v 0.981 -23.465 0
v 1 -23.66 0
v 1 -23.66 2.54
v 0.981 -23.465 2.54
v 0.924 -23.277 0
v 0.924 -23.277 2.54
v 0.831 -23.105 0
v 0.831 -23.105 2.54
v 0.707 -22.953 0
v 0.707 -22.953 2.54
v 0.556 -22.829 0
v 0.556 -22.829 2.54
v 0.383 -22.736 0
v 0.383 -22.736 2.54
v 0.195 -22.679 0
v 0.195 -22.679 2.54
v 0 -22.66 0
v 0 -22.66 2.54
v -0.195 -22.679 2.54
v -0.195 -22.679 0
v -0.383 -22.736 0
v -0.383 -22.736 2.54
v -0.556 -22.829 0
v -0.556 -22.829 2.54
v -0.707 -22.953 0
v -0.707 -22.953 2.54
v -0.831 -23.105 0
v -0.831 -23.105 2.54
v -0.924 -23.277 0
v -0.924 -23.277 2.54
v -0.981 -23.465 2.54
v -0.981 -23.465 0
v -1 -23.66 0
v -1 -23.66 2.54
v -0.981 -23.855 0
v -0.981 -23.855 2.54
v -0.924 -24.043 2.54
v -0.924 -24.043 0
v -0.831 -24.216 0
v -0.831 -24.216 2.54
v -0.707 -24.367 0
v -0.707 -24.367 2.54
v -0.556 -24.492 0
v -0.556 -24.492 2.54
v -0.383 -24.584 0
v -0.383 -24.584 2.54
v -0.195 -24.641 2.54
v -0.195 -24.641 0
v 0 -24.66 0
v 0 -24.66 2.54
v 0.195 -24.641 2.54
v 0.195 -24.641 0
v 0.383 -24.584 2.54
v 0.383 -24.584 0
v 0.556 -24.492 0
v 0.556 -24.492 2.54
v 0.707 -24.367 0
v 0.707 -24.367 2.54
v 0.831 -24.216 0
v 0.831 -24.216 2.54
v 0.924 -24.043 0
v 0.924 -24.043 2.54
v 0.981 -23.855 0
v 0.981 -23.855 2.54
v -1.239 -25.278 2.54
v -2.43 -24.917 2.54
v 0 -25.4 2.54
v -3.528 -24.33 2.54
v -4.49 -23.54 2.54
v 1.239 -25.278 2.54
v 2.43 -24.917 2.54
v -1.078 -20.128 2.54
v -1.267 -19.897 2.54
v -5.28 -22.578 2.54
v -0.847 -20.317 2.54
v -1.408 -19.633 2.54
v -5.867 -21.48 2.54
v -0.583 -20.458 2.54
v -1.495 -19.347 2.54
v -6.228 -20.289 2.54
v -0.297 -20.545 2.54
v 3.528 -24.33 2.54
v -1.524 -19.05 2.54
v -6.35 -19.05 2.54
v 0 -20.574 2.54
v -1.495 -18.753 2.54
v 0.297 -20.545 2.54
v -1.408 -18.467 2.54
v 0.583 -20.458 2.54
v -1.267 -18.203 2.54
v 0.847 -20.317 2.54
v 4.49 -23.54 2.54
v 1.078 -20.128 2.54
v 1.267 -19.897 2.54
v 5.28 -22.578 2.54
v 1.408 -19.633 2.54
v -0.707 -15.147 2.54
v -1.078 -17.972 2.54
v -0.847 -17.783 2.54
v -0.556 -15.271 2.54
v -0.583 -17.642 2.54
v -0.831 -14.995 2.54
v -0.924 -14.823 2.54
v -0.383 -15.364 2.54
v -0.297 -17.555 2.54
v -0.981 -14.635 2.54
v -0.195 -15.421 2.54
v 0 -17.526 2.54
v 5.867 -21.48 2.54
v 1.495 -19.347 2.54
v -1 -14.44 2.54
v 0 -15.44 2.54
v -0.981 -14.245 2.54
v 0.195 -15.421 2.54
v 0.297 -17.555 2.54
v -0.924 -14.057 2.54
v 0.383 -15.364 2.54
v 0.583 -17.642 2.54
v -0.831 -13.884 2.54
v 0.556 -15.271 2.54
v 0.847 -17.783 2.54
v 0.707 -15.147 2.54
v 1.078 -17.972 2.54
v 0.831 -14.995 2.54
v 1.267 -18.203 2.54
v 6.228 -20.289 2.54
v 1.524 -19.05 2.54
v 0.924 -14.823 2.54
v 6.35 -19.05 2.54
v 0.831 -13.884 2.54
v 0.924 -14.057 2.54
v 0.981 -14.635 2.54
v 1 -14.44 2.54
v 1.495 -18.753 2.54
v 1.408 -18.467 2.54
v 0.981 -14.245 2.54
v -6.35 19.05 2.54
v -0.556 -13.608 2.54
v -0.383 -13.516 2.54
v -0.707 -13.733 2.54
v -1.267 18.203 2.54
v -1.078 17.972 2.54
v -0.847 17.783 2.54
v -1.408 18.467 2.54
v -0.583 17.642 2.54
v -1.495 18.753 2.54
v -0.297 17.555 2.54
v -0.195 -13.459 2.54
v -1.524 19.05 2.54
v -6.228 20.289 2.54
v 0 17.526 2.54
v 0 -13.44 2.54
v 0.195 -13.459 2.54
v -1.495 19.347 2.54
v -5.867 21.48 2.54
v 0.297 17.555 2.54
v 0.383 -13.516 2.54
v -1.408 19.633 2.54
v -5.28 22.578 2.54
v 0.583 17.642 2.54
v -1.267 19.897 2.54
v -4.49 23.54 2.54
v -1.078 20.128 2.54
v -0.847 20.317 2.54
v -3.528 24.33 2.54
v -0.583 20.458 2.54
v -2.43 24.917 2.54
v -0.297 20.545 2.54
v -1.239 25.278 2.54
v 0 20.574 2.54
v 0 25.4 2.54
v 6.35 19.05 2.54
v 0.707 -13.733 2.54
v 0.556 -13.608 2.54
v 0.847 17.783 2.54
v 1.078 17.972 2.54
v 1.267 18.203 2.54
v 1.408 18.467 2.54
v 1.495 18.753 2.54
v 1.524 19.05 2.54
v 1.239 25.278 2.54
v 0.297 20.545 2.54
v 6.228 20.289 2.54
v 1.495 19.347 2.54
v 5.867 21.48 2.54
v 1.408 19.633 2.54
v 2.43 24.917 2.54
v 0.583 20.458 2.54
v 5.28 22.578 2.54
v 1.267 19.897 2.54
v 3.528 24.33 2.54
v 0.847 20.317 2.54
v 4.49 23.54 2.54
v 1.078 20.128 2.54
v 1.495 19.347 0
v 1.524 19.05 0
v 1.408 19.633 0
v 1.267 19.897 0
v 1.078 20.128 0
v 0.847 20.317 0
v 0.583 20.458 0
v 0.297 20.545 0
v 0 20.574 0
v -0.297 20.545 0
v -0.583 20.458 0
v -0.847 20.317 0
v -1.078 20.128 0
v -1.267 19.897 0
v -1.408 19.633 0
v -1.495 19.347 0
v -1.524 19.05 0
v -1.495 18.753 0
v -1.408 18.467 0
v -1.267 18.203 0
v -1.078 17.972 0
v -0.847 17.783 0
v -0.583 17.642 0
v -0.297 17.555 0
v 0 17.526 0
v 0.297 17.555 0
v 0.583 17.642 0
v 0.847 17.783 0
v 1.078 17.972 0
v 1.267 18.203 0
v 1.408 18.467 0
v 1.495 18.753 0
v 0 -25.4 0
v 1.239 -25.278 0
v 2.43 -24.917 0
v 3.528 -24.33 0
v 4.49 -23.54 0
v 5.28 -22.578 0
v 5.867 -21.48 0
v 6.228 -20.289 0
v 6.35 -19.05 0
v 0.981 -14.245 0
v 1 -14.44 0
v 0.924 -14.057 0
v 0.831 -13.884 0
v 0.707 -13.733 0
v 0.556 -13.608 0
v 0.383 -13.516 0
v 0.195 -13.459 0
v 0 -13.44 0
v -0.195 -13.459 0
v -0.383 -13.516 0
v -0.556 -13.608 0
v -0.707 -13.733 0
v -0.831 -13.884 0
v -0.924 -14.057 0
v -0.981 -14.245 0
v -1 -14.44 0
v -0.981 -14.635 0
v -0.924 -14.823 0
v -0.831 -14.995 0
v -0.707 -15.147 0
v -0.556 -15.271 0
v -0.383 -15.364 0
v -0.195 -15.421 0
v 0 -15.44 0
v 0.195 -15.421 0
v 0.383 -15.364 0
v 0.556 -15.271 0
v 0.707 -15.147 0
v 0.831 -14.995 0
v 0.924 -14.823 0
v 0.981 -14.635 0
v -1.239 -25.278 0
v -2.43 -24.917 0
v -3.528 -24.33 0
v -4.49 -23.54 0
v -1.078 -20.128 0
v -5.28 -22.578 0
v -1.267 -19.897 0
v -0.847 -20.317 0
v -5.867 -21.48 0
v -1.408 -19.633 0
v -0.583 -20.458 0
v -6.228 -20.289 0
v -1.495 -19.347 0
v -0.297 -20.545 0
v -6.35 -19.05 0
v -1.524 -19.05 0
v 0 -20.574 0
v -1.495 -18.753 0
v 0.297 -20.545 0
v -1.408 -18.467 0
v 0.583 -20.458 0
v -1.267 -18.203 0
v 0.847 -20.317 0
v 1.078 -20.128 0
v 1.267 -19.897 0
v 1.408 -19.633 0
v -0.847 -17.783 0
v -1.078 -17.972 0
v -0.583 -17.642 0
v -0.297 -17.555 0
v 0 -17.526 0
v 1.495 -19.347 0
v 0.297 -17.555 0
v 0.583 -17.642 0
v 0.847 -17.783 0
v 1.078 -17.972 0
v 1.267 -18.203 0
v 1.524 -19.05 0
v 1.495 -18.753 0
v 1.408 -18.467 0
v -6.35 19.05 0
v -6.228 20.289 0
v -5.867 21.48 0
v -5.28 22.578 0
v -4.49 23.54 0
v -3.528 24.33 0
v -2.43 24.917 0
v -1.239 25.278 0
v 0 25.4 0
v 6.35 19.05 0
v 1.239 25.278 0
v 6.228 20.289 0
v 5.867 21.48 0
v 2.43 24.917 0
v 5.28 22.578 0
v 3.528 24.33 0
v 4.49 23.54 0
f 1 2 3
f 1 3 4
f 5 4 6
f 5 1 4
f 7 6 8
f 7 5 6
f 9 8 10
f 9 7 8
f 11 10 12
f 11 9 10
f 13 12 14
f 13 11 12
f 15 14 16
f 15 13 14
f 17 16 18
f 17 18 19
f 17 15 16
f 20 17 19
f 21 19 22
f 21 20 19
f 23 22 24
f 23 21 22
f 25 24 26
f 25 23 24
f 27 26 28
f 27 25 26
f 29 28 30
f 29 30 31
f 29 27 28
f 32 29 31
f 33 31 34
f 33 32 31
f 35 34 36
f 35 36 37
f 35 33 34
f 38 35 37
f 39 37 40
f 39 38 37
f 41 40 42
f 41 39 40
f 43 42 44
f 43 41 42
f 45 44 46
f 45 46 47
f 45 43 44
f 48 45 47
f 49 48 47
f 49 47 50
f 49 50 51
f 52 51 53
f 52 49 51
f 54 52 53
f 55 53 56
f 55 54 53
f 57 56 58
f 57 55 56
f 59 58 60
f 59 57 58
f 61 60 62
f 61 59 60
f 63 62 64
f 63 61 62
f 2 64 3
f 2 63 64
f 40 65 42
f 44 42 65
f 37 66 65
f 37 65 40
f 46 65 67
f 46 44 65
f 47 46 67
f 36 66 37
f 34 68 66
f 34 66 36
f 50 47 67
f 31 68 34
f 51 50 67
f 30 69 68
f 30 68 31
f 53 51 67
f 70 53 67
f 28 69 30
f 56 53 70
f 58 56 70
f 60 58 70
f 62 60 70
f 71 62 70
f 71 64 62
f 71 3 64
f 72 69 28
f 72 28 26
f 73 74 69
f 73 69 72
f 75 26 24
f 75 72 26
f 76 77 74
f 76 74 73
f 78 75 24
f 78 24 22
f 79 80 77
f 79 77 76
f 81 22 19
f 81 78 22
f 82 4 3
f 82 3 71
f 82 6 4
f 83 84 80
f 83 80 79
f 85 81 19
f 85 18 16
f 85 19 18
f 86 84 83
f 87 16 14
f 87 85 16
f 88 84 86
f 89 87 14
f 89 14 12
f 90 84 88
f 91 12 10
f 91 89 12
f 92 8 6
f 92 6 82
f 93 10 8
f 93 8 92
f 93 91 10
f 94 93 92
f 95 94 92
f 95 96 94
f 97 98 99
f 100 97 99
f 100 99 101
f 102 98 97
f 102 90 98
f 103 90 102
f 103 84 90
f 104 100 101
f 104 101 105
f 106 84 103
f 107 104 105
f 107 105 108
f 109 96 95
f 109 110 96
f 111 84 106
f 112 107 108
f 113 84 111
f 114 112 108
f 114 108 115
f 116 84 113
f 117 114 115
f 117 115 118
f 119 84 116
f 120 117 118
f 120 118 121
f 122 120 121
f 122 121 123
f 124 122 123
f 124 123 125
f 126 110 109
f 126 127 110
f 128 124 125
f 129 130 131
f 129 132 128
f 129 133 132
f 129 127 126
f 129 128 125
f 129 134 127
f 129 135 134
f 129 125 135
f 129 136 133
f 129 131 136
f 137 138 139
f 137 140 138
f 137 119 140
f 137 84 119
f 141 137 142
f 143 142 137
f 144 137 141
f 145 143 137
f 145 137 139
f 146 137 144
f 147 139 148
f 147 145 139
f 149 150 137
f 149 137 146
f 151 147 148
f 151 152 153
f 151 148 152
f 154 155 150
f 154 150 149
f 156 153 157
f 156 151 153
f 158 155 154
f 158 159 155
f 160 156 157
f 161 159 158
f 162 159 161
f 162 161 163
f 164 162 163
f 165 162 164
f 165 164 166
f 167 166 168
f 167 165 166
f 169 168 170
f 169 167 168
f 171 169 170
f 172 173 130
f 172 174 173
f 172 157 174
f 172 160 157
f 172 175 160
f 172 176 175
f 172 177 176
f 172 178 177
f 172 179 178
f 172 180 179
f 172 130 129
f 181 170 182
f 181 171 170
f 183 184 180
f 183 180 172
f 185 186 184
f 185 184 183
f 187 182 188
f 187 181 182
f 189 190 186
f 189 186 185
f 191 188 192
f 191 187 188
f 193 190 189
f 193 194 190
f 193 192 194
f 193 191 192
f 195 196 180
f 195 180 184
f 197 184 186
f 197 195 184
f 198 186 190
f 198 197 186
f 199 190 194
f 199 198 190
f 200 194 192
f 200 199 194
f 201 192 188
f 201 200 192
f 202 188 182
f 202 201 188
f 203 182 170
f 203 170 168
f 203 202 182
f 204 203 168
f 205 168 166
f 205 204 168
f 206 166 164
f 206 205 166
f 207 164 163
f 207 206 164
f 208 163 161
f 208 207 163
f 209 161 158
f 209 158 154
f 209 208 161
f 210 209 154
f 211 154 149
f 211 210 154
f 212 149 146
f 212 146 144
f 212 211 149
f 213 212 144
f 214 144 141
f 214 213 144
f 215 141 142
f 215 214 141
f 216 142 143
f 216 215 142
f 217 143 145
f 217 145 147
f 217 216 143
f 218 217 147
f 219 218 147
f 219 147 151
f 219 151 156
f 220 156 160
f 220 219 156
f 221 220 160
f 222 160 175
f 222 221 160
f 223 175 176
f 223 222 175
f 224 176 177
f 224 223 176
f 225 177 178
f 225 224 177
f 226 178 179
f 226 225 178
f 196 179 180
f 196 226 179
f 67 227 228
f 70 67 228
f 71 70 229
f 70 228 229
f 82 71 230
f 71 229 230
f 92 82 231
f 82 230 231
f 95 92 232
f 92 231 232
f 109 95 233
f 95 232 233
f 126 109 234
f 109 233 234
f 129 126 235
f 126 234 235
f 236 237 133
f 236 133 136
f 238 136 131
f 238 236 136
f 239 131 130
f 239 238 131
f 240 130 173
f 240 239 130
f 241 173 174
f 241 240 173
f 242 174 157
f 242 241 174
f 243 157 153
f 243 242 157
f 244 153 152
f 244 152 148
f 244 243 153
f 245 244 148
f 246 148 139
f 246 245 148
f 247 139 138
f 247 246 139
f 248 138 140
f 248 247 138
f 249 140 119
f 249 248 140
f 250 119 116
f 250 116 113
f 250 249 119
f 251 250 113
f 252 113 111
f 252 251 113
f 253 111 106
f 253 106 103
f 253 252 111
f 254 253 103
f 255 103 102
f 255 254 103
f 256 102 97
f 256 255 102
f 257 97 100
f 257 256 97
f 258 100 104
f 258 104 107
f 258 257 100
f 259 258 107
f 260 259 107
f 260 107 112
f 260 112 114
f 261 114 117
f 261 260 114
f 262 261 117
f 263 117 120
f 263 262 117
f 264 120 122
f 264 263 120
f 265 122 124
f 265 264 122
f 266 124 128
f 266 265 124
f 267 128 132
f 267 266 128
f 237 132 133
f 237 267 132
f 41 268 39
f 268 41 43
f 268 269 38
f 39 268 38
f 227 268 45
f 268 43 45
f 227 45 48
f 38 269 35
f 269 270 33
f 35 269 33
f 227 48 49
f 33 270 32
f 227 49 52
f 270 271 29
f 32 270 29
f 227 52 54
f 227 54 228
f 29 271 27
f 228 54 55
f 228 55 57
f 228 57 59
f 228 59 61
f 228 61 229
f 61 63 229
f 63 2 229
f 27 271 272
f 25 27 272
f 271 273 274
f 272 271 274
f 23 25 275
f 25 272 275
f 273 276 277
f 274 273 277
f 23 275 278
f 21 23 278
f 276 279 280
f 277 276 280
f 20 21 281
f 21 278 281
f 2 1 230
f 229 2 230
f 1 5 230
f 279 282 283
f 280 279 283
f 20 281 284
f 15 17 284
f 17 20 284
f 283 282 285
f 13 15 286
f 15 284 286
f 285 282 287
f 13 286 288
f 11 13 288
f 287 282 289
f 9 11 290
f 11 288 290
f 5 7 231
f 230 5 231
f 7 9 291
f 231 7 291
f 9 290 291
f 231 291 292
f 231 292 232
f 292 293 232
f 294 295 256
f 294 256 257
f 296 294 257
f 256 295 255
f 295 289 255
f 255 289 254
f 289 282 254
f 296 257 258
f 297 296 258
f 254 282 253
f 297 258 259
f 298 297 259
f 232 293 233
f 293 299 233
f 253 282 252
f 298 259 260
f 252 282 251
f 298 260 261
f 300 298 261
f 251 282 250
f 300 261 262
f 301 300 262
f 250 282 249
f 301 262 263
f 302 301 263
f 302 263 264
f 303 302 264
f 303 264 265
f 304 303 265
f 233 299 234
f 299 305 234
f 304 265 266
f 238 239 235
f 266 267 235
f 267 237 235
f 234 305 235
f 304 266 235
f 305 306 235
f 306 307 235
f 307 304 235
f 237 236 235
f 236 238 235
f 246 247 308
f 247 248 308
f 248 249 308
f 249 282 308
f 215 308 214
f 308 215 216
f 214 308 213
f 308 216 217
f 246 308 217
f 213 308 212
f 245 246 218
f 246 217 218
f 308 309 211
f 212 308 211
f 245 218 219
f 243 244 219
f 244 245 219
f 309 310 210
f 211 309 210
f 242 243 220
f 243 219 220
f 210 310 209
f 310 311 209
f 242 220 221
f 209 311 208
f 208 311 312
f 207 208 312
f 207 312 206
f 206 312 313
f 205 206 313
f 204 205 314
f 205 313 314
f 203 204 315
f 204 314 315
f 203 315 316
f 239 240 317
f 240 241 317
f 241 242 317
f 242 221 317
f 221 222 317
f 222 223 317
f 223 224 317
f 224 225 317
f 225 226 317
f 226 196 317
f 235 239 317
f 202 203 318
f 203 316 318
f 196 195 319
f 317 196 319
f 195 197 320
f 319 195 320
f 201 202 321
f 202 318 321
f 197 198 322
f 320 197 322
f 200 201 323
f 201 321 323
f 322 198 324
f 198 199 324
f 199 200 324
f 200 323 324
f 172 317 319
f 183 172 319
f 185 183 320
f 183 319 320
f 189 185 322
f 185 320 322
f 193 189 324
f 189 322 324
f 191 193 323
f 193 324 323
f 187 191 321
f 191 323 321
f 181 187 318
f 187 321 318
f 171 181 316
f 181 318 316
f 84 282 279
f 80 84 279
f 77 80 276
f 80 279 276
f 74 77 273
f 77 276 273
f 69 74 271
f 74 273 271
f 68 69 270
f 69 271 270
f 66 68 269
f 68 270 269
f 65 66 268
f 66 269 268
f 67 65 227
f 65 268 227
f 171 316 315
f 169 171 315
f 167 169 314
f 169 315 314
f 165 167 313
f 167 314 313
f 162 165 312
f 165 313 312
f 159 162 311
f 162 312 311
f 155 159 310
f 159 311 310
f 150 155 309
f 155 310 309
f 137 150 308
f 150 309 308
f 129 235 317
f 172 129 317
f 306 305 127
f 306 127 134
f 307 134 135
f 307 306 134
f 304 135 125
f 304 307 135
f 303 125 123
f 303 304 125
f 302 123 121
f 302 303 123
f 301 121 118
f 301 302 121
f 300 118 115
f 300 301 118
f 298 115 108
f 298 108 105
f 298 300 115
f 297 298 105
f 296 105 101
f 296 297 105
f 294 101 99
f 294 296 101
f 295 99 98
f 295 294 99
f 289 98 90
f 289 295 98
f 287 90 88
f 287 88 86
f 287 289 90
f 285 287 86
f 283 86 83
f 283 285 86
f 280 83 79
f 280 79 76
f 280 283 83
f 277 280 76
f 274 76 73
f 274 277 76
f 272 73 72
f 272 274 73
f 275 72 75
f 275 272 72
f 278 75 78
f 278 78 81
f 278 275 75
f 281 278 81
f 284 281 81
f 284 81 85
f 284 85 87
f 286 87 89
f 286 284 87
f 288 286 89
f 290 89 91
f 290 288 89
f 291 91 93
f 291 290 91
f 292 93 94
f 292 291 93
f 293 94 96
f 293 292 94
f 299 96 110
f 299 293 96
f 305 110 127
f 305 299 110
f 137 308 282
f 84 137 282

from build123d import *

# Parameters (mm, degrees)
F0_R     = 1
F0_R_2   = 1.524
F1_DEPTH = 2.54


with BuildPart() as f1:
    # F0 (on Top) → F1 (new body)
    with BuildSketch(Plane.XY):
        with BuildLine():
            Line((6.35, -19.05), (6.35, 19.05))
            ThreePointArc((6.35, 19.05), (4.490128, 23.540128), (0, 25.4))
            ThreePointArc((0, 25.4), (-4.490128, 23.540128), (-6.35, 19.05))
            Line((-6.35, 19.05), (-6.35, -19.05))
            ThreePointArc((-6.35, -19.05), (-4.490128, -23.540128), (0, -25.4))
            ThreePointArc((0, -25.4), (4.490128, -23.540128), (6.35, -19.05))
        make_face()
        with Locations((0, -23.6601)):
            Circle(F0_R, mode=Mode.SUBTRACT)
        with Locations((0, -19.05)):
            Circle(F0_R_2, mode=Mode.SUBTRACT)
        with Locations((0, -14.4399)):
            Circle(F0_R, mode=Mode.SUBTRACT)
        with Locations((0, 19.05)):
            Circle(F0_R_2, mode=Mode.SUBTRACT)
    extrude(amount=F1_DEPTH)


solid = f1.part
